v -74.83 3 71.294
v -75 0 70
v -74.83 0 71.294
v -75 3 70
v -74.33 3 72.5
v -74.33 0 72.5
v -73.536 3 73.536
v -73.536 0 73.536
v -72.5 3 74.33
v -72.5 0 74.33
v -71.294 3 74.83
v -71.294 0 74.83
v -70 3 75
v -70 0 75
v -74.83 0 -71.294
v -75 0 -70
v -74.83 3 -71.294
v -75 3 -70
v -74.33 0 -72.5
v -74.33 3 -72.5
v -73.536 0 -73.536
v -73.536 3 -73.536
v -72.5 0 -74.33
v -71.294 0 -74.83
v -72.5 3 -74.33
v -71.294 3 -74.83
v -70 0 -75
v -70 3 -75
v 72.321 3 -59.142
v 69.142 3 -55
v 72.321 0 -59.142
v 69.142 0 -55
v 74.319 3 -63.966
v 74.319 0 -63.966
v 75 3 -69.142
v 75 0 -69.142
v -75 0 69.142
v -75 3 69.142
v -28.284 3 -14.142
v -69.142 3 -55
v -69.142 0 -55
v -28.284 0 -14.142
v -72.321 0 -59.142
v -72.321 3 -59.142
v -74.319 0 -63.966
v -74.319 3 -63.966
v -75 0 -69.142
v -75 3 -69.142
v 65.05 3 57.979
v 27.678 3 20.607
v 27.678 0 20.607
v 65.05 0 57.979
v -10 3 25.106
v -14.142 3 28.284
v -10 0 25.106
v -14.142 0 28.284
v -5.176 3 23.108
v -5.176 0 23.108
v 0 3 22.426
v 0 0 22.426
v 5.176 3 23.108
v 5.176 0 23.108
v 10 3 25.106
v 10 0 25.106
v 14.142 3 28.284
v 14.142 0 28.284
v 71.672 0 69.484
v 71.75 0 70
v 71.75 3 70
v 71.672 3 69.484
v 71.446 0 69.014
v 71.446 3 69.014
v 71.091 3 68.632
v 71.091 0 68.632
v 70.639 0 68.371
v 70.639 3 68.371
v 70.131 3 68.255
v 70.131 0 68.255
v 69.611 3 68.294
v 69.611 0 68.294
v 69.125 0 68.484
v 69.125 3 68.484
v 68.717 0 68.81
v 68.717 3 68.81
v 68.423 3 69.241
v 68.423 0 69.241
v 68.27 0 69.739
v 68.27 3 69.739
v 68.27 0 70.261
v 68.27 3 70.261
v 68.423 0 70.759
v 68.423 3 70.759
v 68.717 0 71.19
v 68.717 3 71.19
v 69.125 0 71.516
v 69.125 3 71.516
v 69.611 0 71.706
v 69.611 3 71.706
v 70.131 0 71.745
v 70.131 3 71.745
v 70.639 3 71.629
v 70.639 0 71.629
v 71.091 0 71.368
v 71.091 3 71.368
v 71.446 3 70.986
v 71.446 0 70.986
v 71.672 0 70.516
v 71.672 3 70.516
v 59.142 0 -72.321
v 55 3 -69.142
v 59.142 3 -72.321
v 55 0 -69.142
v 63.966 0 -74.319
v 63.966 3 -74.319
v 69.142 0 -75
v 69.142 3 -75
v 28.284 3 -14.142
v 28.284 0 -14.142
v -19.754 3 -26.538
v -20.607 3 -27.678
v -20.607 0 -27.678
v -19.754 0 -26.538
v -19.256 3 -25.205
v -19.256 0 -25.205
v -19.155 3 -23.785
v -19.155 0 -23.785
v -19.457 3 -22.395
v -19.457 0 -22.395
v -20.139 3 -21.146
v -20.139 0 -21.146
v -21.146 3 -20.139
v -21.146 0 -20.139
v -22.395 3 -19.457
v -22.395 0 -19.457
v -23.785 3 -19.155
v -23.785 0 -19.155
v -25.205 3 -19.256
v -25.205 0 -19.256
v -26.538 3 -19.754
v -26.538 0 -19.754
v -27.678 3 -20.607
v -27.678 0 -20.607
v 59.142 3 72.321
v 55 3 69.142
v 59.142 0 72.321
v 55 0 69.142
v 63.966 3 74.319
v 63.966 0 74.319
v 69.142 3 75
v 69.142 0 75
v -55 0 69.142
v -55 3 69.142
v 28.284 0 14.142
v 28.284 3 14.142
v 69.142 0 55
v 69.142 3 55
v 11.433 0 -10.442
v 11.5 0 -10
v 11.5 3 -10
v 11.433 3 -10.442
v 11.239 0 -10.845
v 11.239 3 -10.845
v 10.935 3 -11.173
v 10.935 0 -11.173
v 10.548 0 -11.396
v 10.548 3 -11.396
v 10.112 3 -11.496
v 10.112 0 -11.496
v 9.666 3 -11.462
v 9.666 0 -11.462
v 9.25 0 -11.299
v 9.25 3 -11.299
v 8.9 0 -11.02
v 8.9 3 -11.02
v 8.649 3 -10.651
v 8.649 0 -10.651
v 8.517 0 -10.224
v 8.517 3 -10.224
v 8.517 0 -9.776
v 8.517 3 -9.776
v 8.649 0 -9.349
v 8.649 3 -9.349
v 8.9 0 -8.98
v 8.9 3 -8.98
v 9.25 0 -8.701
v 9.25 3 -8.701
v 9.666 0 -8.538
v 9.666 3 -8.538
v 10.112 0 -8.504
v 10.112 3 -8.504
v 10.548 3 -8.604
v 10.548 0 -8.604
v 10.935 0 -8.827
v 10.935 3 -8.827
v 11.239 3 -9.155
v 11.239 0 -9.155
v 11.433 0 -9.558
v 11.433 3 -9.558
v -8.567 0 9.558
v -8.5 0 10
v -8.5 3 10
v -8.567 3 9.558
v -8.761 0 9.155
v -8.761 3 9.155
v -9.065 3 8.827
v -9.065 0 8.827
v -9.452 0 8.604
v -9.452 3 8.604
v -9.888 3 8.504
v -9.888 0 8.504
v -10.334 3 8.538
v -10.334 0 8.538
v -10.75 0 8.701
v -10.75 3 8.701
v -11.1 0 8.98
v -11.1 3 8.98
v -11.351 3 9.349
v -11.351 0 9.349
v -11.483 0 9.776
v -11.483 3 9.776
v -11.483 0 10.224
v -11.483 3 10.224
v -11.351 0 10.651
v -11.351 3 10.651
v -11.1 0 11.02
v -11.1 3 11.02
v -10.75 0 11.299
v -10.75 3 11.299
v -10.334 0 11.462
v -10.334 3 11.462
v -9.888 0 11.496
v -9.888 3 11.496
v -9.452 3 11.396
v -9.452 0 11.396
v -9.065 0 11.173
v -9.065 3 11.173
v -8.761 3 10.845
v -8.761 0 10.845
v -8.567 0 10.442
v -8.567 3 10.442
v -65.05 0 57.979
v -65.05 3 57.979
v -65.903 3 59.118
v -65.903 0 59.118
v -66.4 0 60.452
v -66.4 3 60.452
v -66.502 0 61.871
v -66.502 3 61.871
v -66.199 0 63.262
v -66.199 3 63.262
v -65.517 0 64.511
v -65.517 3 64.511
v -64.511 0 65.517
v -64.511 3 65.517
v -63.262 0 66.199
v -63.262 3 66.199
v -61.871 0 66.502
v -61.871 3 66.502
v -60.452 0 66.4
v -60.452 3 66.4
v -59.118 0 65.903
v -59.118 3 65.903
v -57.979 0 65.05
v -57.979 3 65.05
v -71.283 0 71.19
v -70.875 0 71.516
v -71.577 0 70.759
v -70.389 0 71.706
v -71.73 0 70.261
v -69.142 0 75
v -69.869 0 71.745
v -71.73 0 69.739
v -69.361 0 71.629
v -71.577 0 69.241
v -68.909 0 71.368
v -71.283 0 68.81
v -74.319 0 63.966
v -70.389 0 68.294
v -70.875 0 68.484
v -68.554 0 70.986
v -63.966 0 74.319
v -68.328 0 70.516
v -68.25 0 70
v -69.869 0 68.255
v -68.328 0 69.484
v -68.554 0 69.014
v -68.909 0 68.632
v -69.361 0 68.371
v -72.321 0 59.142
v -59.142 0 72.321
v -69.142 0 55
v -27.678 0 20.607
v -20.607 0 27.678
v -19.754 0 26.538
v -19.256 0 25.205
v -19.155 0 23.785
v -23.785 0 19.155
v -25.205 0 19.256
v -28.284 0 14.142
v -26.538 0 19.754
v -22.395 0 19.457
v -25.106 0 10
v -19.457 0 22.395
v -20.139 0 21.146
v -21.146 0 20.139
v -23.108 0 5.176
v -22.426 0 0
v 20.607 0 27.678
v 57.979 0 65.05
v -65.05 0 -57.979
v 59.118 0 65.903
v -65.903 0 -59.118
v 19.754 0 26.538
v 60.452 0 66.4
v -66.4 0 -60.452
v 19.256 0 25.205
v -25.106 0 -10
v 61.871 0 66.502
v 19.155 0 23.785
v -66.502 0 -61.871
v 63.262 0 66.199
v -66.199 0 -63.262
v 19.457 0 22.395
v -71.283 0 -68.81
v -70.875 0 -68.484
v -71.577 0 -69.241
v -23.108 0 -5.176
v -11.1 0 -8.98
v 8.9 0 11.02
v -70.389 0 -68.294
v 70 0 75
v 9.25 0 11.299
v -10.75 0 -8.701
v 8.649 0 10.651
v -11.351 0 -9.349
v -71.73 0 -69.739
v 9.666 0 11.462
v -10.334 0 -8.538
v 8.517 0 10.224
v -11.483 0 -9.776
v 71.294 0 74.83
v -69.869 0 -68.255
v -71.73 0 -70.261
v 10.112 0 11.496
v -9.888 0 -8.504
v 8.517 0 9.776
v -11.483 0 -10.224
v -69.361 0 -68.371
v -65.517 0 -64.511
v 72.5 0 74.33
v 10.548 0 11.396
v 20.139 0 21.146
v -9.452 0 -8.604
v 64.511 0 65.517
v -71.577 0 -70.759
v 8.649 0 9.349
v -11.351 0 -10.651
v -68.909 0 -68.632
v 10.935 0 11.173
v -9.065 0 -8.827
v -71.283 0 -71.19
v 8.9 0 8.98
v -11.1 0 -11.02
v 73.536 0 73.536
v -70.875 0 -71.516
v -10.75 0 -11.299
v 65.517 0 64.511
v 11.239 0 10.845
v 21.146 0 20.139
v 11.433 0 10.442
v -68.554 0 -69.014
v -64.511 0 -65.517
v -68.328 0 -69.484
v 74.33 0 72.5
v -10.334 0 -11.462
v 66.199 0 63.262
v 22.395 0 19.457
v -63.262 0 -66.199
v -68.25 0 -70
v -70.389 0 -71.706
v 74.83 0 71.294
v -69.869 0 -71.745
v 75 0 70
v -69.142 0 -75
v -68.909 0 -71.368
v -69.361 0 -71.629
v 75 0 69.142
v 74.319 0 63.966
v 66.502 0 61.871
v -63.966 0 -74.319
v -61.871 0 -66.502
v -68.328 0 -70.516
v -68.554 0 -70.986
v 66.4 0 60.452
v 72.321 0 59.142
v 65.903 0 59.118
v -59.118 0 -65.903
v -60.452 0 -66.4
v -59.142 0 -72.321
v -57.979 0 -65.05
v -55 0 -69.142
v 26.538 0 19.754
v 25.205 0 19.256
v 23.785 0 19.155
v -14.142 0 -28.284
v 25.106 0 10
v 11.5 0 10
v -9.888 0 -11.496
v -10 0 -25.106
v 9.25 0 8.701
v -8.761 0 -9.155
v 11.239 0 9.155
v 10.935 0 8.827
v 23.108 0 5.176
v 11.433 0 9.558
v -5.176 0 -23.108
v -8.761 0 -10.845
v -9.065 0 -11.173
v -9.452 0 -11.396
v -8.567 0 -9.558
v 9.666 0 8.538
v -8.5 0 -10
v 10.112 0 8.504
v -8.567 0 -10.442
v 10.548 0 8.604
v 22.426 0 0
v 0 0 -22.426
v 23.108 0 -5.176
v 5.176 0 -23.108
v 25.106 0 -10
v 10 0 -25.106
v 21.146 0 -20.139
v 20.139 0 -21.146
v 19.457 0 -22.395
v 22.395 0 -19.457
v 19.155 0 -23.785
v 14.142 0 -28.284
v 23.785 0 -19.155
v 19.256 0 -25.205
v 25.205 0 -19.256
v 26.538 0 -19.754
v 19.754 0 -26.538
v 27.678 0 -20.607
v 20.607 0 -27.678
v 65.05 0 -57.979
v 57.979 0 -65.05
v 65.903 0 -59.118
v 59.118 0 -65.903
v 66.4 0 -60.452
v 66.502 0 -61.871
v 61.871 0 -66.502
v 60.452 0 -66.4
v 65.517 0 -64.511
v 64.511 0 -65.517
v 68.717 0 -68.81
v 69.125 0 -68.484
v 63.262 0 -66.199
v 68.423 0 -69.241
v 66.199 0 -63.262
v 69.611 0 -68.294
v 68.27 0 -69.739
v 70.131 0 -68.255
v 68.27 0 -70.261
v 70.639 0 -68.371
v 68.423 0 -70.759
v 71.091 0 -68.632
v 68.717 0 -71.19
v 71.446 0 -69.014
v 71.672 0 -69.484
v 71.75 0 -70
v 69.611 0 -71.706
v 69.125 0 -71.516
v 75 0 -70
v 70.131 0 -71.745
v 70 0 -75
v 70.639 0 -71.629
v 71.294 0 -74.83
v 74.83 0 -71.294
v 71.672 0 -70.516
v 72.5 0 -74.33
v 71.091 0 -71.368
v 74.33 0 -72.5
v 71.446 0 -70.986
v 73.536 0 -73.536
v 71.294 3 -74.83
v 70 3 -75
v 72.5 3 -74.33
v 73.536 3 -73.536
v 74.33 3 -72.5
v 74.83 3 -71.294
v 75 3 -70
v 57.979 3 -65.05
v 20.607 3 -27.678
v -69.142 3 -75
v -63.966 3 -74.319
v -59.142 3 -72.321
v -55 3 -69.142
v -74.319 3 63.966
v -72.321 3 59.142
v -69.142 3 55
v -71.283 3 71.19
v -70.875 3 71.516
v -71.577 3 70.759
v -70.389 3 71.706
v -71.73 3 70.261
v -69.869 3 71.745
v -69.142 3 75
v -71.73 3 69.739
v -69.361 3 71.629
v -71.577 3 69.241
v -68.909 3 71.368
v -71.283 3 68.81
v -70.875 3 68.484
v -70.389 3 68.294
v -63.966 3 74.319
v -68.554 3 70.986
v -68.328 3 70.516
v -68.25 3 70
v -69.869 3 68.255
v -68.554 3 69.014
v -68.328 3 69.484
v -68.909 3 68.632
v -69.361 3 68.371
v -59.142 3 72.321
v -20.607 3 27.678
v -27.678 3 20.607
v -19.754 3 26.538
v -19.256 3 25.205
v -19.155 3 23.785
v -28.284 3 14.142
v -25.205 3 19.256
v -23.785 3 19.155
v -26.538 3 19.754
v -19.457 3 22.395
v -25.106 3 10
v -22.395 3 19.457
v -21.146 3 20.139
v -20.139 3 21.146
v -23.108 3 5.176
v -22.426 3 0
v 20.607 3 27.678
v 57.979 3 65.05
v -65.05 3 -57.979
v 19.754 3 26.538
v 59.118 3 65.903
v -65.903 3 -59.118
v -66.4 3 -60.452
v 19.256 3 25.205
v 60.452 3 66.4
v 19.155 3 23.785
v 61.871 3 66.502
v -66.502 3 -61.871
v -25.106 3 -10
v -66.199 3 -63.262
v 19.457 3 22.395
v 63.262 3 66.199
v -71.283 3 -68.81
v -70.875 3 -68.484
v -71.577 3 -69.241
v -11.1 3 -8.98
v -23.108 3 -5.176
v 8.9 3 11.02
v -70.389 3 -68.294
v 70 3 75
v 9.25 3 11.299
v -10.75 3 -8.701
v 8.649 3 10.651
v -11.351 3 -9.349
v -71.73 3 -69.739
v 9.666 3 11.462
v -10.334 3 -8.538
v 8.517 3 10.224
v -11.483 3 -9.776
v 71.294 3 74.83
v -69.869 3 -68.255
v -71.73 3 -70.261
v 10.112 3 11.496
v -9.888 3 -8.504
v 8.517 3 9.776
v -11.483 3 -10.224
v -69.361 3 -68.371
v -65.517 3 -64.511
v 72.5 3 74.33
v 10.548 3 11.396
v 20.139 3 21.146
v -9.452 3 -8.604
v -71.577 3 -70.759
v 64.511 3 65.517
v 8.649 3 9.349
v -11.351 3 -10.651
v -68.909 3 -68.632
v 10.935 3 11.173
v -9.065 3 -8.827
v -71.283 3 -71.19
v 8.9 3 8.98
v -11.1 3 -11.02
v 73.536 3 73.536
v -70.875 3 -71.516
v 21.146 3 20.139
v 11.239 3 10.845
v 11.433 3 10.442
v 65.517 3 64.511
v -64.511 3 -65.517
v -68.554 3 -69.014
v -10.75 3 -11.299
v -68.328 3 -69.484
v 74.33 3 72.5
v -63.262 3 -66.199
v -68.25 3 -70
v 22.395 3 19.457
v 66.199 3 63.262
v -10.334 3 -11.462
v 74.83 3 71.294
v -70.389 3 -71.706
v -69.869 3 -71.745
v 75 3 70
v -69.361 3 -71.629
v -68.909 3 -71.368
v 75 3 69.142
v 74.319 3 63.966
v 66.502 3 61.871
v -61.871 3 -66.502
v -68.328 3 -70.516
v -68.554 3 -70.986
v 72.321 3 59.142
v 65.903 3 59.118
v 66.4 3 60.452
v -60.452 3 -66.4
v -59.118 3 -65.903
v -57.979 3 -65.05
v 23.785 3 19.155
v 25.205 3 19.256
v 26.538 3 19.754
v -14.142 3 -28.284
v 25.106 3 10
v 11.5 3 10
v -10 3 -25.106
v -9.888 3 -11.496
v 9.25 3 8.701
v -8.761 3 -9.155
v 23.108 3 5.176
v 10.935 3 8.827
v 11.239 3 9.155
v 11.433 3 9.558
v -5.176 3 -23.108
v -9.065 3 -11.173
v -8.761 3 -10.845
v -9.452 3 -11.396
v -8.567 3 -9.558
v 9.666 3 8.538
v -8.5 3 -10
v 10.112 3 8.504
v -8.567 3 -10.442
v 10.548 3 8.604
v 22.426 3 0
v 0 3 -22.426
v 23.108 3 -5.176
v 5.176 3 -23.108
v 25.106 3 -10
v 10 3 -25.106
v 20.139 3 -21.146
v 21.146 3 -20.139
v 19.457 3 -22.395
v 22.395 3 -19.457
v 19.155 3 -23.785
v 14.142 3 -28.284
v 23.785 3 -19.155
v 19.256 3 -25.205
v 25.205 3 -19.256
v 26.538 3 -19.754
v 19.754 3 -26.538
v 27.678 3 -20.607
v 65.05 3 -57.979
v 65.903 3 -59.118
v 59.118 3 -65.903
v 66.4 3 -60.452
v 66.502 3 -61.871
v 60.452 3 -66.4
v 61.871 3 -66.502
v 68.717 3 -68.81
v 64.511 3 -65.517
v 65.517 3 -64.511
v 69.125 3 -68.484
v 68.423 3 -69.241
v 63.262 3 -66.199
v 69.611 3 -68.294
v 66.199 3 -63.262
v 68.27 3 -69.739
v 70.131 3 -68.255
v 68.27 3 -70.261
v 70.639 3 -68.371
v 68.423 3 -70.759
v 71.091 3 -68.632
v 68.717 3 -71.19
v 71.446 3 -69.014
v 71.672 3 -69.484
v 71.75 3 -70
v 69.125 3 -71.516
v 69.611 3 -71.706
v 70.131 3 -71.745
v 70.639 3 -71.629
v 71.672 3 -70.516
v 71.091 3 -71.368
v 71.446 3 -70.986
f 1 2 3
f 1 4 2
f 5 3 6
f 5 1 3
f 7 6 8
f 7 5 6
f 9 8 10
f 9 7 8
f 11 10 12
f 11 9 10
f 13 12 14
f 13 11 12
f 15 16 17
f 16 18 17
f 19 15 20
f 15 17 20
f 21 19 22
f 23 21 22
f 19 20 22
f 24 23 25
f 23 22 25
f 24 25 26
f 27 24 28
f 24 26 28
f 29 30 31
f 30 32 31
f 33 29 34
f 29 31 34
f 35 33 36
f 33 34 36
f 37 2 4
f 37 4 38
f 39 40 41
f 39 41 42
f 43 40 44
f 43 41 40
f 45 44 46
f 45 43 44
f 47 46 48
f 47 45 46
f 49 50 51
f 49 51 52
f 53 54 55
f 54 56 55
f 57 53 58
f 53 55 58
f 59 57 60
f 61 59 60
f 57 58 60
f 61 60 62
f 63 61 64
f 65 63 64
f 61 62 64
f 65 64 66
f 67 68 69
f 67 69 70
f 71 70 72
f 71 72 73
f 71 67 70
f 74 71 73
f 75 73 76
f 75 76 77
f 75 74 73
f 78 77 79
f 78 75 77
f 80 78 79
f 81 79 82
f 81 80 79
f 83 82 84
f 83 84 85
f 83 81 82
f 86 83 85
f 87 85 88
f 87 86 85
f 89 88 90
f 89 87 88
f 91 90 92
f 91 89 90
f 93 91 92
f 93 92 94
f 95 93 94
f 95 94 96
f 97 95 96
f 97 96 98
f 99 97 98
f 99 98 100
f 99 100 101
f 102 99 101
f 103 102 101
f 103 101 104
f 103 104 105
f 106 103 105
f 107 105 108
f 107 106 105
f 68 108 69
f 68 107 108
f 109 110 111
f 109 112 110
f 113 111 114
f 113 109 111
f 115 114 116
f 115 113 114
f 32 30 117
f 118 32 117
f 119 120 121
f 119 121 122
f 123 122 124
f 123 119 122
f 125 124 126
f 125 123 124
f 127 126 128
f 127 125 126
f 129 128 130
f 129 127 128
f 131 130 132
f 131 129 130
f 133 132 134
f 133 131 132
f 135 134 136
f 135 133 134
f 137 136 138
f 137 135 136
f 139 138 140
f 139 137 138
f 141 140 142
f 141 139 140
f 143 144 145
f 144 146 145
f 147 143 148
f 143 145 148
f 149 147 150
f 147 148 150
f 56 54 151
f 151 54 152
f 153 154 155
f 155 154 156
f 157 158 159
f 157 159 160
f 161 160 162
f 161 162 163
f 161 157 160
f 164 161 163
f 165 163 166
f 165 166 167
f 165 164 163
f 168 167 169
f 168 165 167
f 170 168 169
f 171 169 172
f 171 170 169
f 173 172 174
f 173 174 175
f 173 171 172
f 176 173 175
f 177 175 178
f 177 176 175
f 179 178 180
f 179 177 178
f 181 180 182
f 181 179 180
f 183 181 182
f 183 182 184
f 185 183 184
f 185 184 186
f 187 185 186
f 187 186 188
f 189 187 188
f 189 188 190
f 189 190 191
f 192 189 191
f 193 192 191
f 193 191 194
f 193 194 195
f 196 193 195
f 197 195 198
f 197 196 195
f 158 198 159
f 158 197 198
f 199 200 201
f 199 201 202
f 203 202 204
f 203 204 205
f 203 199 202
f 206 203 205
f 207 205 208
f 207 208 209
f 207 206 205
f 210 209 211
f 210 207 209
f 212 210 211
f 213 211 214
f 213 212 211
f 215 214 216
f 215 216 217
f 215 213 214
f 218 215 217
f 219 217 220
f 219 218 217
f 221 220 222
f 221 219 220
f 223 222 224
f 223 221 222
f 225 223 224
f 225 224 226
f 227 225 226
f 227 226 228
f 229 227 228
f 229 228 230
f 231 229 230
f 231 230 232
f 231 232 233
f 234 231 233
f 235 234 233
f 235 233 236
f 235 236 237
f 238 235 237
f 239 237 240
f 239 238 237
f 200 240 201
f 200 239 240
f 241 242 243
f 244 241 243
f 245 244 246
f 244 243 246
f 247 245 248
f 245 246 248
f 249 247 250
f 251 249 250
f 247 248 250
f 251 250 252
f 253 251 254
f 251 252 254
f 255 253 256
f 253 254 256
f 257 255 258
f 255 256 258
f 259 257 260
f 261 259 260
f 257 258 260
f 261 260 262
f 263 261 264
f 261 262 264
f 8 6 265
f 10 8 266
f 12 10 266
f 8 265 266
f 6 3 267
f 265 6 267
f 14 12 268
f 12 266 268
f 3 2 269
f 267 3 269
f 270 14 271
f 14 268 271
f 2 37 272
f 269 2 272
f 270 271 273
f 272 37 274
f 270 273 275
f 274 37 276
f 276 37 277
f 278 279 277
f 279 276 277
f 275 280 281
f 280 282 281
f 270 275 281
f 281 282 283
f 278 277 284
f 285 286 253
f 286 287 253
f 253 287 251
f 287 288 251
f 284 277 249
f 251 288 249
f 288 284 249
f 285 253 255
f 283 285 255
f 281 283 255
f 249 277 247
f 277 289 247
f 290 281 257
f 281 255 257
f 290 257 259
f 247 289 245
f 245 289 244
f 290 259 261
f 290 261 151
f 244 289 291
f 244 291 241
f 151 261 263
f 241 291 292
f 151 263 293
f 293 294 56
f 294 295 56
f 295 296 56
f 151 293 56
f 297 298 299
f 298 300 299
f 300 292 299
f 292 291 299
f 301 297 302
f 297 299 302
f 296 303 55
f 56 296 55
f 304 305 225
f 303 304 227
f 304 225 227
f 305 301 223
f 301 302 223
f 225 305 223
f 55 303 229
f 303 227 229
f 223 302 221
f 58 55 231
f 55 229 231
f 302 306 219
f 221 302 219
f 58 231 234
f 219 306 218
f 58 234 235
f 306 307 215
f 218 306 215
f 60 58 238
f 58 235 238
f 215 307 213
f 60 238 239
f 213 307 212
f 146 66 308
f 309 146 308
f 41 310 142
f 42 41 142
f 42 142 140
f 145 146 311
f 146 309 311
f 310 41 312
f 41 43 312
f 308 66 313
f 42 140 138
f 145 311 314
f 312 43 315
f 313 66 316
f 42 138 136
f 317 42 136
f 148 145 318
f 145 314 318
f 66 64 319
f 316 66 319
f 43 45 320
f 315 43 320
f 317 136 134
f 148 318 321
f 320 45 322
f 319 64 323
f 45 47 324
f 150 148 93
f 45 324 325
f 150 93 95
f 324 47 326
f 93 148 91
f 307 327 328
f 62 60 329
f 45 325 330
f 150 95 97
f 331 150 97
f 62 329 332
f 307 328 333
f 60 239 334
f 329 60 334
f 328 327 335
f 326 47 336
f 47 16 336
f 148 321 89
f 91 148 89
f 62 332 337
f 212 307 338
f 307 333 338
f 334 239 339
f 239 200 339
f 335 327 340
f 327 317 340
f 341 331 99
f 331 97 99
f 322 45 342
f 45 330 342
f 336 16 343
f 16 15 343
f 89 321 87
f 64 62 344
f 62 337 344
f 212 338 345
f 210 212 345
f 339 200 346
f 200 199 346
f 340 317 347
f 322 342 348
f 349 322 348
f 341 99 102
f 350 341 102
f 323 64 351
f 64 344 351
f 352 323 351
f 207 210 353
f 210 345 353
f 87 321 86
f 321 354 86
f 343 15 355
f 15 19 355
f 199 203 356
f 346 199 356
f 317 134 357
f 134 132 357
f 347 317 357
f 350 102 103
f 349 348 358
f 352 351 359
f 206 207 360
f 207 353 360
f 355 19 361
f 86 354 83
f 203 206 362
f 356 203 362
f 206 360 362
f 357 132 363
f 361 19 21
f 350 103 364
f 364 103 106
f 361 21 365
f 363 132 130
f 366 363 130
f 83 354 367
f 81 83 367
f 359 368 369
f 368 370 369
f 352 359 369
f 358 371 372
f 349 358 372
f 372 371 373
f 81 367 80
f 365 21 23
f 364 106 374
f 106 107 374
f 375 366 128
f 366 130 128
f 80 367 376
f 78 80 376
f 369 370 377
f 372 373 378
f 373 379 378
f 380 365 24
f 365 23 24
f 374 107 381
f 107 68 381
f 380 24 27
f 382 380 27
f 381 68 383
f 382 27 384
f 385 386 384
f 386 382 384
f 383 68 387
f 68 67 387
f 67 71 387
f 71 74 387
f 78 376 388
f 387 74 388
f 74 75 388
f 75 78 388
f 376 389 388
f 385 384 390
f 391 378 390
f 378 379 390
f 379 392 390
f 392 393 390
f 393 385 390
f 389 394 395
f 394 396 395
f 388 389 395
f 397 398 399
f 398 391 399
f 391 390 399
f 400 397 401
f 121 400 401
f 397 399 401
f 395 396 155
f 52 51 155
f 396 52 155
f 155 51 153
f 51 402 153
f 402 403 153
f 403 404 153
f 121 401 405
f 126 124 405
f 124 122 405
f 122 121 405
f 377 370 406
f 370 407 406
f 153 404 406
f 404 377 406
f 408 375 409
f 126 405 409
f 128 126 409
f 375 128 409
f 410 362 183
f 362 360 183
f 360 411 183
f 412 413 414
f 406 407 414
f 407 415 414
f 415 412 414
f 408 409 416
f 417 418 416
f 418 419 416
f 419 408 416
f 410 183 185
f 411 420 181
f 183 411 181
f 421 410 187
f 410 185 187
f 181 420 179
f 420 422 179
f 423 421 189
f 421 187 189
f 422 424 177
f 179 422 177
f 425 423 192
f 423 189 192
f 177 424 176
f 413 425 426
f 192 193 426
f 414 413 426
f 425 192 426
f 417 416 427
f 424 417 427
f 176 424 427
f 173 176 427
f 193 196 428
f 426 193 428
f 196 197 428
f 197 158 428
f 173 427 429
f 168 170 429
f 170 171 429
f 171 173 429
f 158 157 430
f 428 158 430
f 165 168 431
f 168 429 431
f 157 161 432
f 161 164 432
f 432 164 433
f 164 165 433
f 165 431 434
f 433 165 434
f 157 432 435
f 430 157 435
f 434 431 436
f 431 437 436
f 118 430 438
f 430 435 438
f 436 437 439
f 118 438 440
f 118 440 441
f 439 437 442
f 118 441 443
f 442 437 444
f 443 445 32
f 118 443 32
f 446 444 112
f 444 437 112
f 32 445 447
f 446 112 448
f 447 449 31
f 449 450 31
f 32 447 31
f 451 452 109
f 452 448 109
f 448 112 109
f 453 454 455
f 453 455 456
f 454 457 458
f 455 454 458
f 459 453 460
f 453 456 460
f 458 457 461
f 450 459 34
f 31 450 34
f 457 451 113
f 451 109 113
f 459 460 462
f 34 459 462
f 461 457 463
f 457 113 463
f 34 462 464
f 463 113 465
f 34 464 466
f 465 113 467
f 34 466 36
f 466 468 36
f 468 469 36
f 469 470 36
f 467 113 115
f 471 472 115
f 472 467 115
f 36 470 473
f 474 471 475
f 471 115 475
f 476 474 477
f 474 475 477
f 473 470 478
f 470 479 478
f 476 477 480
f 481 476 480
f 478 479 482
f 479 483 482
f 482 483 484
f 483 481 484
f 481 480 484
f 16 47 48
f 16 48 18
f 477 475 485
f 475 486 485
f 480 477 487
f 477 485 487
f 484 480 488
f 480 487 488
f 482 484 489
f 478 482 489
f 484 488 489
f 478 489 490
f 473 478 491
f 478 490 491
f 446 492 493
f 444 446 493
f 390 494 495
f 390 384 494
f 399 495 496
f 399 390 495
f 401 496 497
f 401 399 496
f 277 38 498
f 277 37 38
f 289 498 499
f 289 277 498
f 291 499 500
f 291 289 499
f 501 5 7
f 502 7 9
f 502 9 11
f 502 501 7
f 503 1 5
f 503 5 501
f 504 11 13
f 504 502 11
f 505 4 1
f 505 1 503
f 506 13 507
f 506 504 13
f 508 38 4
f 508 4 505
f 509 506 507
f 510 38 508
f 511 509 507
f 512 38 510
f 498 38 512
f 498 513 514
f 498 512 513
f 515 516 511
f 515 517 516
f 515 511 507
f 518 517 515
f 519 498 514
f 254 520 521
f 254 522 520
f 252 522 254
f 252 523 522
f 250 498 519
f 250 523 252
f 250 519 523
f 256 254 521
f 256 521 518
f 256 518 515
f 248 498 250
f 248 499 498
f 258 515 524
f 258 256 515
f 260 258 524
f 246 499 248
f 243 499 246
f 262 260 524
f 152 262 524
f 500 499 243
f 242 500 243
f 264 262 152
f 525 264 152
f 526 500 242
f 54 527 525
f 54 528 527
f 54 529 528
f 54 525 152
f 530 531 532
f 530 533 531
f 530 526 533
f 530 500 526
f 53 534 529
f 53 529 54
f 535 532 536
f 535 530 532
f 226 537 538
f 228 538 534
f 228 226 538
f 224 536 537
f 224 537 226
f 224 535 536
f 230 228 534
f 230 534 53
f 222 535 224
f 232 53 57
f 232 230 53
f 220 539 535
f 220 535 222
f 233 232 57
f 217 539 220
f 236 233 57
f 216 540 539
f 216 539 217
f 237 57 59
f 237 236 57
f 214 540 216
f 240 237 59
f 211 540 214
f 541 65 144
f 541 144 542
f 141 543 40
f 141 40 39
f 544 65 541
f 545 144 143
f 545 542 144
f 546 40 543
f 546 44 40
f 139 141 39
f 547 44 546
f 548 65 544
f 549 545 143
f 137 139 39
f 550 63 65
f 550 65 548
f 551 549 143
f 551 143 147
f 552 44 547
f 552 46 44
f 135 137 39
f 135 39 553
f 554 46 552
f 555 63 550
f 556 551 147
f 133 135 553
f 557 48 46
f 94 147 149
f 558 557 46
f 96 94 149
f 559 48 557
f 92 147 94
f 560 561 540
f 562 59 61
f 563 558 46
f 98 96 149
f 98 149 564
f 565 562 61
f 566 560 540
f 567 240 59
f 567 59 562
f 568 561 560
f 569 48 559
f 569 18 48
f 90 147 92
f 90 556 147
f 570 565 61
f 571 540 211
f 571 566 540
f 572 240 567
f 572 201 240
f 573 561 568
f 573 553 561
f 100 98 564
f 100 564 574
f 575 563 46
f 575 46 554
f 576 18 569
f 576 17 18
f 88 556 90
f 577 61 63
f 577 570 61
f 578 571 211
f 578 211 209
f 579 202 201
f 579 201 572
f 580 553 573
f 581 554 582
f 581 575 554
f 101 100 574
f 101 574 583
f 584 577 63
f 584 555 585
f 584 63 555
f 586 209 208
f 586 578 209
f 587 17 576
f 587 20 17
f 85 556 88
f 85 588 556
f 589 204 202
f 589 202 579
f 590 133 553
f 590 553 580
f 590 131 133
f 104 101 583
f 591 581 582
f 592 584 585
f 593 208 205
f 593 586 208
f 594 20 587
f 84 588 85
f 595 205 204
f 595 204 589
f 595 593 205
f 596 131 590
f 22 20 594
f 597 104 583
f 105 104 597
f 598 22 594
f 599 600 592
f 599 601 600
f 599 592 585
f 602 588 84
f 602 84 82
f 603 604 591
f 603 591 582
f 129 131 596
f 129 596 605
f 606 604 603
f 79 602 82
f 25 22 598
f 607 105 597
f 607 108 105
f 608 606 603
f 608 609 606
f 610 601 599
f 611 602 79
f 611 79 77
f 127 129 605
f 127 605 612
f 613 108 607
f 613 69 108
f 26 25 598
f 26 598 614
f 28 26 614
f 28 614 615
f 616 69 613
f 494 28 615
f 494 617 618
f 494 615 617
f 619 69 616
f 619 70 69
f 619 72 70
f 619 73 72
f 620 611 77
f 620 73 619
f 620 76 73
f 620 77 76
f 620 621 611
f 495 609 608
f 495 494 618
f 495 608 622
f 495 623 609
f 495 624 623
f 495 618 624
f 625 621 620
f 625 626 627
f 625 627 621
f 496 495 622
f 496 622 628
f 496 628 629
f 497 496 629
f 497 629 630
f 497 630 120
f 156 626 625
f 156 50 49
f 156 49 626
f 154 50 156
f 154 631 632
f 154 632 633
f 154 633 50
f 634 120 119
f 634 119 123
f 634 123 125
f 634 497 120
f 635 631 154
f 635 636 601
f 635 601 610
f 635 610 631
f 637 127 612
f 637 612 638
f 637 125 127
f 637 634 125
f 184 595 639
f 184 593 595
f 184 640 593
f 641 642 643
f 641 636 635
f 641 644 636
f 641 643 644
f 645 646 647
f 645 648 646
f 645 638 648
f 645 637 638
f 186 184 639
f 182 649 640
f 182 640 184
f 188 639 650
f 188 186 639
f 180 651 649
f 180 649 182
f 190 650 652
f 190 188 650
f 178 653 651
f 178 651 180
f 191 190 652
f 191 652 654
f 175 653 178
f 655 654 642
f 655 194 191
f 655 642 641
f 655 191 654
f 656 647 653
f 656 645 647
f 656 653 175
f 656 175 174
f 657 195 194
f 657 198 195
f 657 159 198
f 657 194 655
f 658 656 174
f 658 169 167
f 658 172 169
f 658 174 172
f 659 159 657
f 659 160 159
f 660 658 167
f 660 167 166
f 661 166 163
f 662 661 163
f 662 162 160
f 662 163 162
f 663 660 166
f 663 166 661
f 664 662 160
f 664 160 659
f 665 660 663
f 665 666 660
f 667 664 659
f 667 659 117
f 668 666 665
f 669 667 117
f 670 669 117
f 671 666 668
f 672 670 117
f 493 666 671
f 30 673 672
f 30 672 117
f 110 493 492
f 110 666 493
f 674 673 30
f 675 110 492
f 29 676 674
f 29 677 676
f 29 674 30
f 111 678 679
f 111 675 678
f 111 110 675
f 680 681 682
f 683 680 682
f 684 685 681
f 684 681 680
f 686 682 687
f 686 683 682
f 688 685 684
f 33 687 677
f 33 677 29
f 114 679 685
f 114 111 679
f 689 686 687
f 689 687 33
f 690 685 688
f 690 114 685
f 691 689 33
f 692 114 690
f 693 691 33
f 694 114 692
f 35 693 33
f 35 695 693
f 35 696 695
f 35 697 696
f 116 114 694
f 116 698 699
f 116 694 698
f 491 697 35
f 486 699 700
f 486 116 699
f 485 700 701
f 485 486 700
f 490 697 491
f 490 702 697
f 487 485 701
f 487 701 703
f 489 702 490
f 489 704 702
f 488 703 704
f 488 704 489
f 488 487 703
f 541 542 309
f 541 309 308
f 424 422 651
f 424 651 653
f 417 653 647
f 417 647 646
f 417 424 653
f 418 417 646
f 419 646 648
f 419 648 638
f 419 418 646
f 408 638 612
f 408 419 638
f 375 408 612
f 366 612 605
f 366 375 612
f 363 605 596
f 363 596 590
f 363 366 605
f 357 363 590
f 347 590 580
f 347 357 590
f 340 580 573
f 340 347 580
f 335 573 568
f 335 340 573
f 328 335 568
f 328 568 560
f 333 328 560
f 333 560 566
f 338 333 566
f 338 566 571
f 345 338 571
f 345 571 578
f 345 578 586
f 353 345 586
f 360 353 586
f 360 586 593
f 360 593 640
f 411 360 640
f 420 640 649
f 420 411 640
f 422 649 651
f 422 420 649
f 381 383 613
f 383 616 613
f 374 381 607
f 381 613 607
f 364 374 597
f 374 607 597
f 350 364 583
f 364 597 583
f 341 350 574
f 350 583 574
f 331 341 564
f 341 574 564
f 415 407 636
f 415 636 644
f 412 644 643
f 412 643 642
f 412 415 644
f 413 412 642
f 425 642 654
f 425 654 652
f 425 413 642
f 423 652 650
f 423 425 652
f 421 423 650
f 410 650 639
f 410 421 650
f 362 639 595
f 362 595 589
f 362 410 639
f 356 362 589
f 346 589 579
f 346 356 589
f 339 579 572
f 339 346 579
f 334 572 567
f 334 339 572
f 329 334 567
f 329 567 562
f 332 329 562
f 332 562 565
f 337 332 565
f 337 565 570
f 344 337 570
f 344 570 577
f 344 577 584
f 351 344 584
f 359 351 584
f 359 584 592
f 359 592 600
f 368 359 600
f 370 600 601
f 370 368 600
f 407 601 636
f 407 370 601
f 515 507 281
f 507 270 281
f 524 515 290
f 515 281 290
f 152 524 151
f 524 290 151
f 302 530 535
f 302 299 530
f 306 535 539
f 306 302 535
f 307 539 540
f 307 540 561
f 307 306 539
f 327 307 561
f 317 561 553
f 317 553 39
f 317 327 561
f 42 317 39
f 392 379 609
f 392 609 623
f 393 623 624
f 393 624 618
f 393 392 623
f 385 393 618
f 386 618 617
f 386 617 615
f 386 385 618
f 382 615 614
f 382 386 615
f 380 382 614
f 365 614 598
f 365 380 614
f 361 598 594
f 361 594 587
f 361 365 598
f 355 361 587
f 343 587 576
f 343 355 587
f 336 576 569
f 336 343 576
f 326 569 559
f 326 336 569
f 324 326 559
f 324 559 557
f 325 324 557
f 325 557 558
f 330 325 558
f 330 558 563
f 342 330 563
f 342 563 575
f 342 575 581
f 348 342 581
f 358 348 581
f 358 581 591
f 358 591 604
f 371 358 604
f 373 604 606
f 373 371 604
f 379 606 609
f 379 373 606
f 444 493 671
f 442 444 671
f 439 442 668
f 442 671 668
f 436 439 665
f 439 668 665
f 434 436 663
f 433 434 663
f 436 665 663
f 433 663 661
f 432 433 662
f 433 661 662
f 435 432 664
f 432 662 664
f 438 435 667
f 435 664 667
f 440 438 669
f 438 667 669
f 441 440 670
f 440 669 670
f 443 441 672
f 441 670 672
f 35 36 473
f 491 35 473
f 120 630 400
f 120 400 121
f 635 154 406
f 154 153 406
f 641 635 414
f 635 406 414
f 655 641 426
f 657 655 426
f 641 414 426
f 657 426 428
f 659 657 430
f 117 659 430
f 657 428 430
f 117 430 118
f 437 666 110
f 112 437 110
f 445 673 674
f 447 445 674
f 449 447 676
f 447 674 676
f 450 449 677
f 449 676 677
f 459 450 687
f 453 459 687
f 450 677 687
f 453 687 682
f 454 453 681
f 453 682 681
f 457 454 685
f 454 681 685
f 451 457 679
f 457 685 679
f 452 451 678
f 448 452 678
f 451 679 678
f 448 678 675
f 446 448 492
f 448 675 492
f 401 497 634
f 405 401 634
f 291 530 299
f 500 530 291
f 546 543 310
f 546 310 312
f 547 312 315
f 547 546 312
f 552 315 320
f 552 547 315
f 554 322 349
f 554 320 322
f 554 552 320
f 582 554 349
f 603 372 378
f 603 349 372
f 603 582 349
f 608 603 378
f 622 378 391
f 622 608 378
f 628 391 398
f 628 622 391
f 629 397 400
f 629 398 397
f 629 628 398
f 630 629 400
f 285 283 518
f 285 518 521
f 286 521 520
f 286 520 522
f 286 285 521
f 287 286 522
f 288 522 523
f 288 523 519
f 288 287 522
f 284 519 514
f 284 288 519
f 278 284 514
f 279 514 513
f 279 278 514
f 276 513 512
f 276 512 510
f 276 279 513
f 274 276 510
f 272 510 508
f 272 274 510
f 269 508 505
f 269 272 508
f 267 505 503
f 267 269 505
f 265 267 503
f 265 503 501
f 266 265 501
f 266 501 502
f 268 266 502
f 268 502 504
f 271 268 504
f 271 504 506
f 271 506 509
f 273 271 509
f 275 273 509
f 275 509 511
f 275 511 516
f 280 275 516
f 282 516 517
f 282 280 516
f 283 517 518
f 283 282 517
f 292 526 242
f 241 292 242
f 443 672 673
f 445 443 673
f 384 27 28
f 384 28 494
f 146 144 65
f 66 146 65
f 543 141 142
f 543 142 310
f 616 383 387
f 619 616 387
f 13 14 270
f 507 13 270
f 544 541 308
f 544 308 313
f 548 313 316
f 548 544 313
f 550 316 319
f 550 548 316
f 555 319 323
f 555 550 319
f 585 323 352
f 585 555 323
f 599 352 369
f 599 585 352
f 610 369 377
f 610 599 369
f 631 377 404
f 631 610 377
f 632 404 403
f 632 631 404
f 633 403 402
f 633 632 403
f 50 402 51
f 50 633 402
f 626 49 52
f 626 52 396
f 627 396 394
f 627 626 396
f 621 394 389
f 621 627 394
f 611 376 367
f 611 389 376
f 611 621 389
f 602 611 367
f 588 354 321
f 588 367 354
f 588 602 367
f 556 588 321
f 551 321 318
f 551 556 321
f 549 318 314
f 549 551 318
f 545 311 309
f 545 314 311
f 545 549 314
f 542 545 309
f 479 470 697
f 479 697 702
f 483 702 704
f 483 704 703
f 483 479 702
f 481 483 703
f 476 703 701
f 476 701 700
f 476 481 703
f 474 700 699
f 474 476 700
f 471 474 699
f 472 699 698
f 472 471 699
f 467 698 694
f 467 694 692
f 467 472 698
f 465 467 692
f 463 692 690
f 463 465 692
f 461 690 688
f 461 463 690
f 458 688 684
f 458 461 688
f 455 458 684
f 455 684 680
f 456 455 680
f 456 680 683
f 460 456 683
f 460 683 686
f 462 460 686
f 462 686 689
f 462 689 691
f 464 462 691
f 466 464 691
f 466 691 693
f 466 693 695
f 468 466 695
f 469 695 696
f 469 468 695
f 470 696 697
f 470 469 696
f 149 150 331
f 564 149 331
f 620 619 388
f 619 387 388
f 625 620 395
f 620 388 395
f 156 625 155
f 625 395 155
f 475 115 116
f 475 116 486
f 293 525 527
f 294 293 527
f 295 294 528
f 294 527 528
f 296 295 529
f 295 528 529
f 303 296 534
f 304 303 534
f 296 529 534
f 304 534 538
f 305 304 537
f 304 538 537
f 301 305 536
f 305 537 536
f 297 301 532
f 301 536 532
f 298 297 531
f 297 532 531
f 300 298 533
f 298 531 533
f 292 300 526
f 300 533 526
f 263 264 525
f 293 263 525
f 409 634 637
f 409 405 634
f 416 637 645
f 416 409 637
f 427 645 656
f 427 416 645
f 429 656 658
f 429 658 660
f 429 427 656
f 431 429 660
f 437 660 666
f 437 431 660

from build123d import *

# Parameters (mm, degrees)
SKETCH3_W           = 150
SKETCH3_H           = 150
SKETCH3_R           = 1.75
SKETCH3_R_2         = 1.5
BOSS_EXTRUDE2_DEPTH = 3
CUT_EXTRUDE2_REACH  = 5
FILLET2_R           = 5
FILLET3_R           = 20


with BuildPart() as part:
    # Sketch3 → Boss-Extrude2 (new body)
    with BuildSketch(Plane(origin=(0, 0, 0), x_dir=(1, 0, 0), z_dir=(0, 1, 0))):
        Rectangle(SKETCH3_W, SKETCH3_H)
        with Locations((-70, 70)):
            Circle(SKETCH3_R, mode=Mode.SUBTRACT)
        with Locations((70, -70)):
            Circle(SKETCH3_R, mode=Mode.SUBTRACT)
        with Locations((-70, -70)):
            Circle(SKETCH3_R, mode=Mode.SUBTRACT)
        with Locations((70, 70)):
            Circle(SKETCH3_R, mode=Mode.SUBTRACT)
        with Locations((-10, 10)):
            Circle(SKETCH3_R_2, mode=Mode.SUBTRACT)
        with Locations((10, -10)):
            Circle(SKETCH3_R_2, mode=Mode.SUBTRACT)
        with Locations((-10, -10)):
            Circle(SKETCH3_R_2, mode=Mode.SUBTRACT)
        with Locations((10, 10)):
            Circle(SKETCH3_R_2, mode=Mode.SUBTRACT)
    extrude(amount=BOSS_EXTRUDE2_DEPTH)

    # Sketch4 → Cut-Extrude2 (cut, up to next)
    with BuildSketch(Plane(origin=(0, 3, 0), x_dir=(1, 0, 0), z_dir=(0, 1, 0)), mode=Mode.PRIVATE) as cut_extrude2_sk1:
        with BuildLine():
            Line((-27.67766953, 20.606601718), (-65.050252532, 57.97918472))
            ThreePointArc((-65.050252532, 57.97918472), (-65.050252532, 65.050252532), (-57.97918472, 65.050252532))
            Line((-57.97918472, 65.050252532), (-20.606601718, 27.67766953))
            ThreePointArc((-20.606601718, 27.67766953), (-20.606601718, 20.606601718), (-27.67766953, 20.606601718))
        make_face()
    cut_extrude2_tool1 = extrude(cut_extrude2_sk1.sketch, amount=-CUT_EXTRUDE2_REACH, mode=Mode.PRIVATE) & part.part
    add(cut_extrude2_tool1.solids().sort_by_distance((-42.828427, 3, -42.828427))[0], mode=Mode.SUBTRACT)
    # Sketch4 → Cut-Extrude2 (cut, up to next)
    with BuildSketch(Plane(origin=(0, 3, 0), x_dir=(1, 0, 0), z_dir=(0, 1, 0)), mode=Mode.PRIVATE) as cut_extrude2_sk2:
        Polygon((-75, 60.857864376), (-14.142135624, 0), (-75, -60.857864376), align=None)
    cut_extrude2_tool2 = extrude(cut_extrude2_sk2.sketch, amount=-CUT_EXTRUDE2_REACH, mode=Mode.PRIVATE) & part.part
    add(cut_extrude2_tool2.solids().sort_by_distance((-54.714045, 3, 0))[0], mode=Mode.SUBTRACT)
    # Sketch4 → Cut-Extrude2 (cut, up to next)
    with BuildSketch(Plane(origin=(0, 3, 0), x_dir=(1, 0, 0), z_dir=(0, 1, 0)), mode=Mode.PRIVATE) as cut_extrude2_sk3:
        with BuildLine():
            Line((27.67766953, 20.606601718), (65.050252532, 57.97918472))
            ThreePointArc((65.050252532, 57.97918472), (65.050252532, 65.050252532), (57.97918472, 65.050252532))
            Line((57.97918472, 65.050252532), (20.606601718, 27.67766953))
            ThreePointArc((20.606601718, 27.67766953), (20.606601718, 20.606601718), (27.67766953, 20.606601718))
        make_face()
    cut_extrude2_tool3 = extrude(cut_extrude2_sk3.sketch, amount=-CUT_EXTRUDE2_REACH, mode=Mode.PRIVATE) & part.part
    add(cut_extrude2_tool3.solids().sort_by_distance((42.828427, 3, -42.828427))[0], mode=Mode.SUBTRACT)
    # Sketch4 → Cut-Extrude2 (cut, up to next)
    with BuildSketch(Plane(origin=(0, 3, 0), x_dir=(1, 0, 0), z_dir=(0, 1, 0)), mode=Mode.PRIVATE) as cut_extrude2_sk4:
        with BuildLine():
            Line((27.67766953, -20.606601718), (65.050252532, -57.97918472))
            ThreePointArc((65.050252532, -57.97918472), (65.050252532, -65.050252532), (57.97918472, -65.050252532))
            Line((57.97918472, -65.050252532), (20.606601718, -27.67766953))
            ThreePointArc((20.606601718, -27.67766953), (20.606601718, -20.606601718), (27.67766953, -20.606601718))
        make_face()
    cut_extrude2_tool4 = extrude(cut_extrude2_sk4.sketch, amount=-CUT_EXTRUDE2_REACH, mode=Mode.PRIVATE) & part.part
    add(cut_extrude2_tool4.solids().sort_by_distance((42.828427, 3, 42.828427))[0], mode=Mode.SUBTRACT)
    # Sketch4 → Cut-Extrude2 (cut, up to next)
    with BuildSketch(Plane(origin=(0, 3, 0), x_dir=(1, 0, 0), z_dir=(0, 1, 0)), mode=Mode.PRIVATE) as cut_extrude2_sk5:
        with BuildLine():
            Line((-27.67766953, -20.606601718), (-65.050252532, -57.97918472))
            ThreePointArc((-65.050252532, -57.97918472), (-65.050252532, -65.050252532), (-57.97918472, -65.050252532))
            Line((-57.97918472, -65.050252532), (-20.606601718, -27.67766953))
            ThreePointArc((-20.606601718, -27.67766953), (-20.606601718, -20.606601718), (-27.67766953, -20.606601718))
        make_face()
    cut_extrude2_tool5 = extrude(cut_extrude2_sk5.sketch, amount=-CUT_EXTRUDE2_REACH, mode=Mode.PRIVATE) & part.part
    add(cut_extrude2_tool5.solids().sort_by_distance((-42.828427, 3, 42.828427))[0], mode=Mode.SUBTRACT)
    # Sketch4 → Cut-Extrude2 (cut, up to next)
    with BuildSketch(Plane(origin=(0, 3, 0), x_dir=(1, 0, 0), z_dir=(0, 1, 0)), mode=Mode.PRIVATE) as cut_extrude2_sk6:
        Polygon((75, 60.857864376), (14.142135624, 0), (75, -60.857864376), align=None)
    cut_extrude2_tool6 = extrude(cut_extrude2_sk6.sketch, amount=-CUT_EXTRUDE2_REACH, mode=Mode.PRIVATE) & part.part
    add(cut_extrude2_tool6.solids().sort_by_distance((54.714045, 3, 0))[0], mode=Mode.SUBTRACT)
    # Sketch4 → Cut-Extrude2 (cut, up to next)
    with BuildSketch(Plane(origin=(0, 3, 0), x_dir=(1, 0, 0), z_dir=(0, 1, 0)), mode=Mode.PRIVATE) as cut_extrude2_sk7:
        Polygon((-60.857864376, -75), (60.857864376, -75), (0, -14.142135624), align=None)
    cut_extrude2_tool7 = extrude(cut_extrude2_sk7.sketch, amount=-CUT_EXTRUDE2_REACH, mode=Mode.PRIVATE) & part.part
    add(cut_extrude2_tool7.solids().sort_by_distance((0, 3, 54.714045))[0], mode=Mode.SUBTRACT)
    # Sketch4 → Cut-Extrude2 (cut, up to next)
    with BuildSketch(Plane(origin=(0, 3, 0), x_dir=(1, 0, 0), z_dir=(0, 1, 0)), mode=Mode.PRIVATE) as cut_extrude2_sk8:
        Polygon((-60.857864376, 75), (0, 14.142135624), (60.857864376, 75), align=None)
    cut_extrude2_tool8 = extrude(cut_extrude2_sk8.sketch, amount=-CUT_EXTRUDE2_REACH, mode=Mode.PRIVATE) & part.part
    add(cut_extrude2_tool8.solids().sort_by_distance((0, 3, -54.714045))[0], mode=Mode.SUBTRACT)

    # Fillet2
    fillet2_edges = [part.edges().sort_by_distance(p)[0] for p in [
        (75, 1.5, 75),
        (-75, 1.5, 75),
        (-75, 1.5, -75),
        (75, 1.5, -75),
    ]]
    fillet(fillet2_edges, radius=FILLET2_R)

    # Fillet3
    fillet3_edges = [part.edges().sort_by_distance(p)[0] for p in [
        (75, 1.5, -60.857864376),
        (75, 1.5, 60.857864376),
        (14.142135624, 1.5, 0),
        (-60.857864376, 1.5, 75),
        (0, 1.5, 14.142135624),
        (60.857864376, 1.5, 75),
        (-75, 1.5, 60.857864376),
        (-75, 1.5, -60.857864376),
        (-14.142135624, 1.5, 0),
        (-60.857864376, 1.5, -75),
        (60.857864376, 1.5, -75),
        (0, 1.5, -14.142135624),
    ]]
    fillet(fillet3_edges, radius=FILLET3_R)


solid = part.part
